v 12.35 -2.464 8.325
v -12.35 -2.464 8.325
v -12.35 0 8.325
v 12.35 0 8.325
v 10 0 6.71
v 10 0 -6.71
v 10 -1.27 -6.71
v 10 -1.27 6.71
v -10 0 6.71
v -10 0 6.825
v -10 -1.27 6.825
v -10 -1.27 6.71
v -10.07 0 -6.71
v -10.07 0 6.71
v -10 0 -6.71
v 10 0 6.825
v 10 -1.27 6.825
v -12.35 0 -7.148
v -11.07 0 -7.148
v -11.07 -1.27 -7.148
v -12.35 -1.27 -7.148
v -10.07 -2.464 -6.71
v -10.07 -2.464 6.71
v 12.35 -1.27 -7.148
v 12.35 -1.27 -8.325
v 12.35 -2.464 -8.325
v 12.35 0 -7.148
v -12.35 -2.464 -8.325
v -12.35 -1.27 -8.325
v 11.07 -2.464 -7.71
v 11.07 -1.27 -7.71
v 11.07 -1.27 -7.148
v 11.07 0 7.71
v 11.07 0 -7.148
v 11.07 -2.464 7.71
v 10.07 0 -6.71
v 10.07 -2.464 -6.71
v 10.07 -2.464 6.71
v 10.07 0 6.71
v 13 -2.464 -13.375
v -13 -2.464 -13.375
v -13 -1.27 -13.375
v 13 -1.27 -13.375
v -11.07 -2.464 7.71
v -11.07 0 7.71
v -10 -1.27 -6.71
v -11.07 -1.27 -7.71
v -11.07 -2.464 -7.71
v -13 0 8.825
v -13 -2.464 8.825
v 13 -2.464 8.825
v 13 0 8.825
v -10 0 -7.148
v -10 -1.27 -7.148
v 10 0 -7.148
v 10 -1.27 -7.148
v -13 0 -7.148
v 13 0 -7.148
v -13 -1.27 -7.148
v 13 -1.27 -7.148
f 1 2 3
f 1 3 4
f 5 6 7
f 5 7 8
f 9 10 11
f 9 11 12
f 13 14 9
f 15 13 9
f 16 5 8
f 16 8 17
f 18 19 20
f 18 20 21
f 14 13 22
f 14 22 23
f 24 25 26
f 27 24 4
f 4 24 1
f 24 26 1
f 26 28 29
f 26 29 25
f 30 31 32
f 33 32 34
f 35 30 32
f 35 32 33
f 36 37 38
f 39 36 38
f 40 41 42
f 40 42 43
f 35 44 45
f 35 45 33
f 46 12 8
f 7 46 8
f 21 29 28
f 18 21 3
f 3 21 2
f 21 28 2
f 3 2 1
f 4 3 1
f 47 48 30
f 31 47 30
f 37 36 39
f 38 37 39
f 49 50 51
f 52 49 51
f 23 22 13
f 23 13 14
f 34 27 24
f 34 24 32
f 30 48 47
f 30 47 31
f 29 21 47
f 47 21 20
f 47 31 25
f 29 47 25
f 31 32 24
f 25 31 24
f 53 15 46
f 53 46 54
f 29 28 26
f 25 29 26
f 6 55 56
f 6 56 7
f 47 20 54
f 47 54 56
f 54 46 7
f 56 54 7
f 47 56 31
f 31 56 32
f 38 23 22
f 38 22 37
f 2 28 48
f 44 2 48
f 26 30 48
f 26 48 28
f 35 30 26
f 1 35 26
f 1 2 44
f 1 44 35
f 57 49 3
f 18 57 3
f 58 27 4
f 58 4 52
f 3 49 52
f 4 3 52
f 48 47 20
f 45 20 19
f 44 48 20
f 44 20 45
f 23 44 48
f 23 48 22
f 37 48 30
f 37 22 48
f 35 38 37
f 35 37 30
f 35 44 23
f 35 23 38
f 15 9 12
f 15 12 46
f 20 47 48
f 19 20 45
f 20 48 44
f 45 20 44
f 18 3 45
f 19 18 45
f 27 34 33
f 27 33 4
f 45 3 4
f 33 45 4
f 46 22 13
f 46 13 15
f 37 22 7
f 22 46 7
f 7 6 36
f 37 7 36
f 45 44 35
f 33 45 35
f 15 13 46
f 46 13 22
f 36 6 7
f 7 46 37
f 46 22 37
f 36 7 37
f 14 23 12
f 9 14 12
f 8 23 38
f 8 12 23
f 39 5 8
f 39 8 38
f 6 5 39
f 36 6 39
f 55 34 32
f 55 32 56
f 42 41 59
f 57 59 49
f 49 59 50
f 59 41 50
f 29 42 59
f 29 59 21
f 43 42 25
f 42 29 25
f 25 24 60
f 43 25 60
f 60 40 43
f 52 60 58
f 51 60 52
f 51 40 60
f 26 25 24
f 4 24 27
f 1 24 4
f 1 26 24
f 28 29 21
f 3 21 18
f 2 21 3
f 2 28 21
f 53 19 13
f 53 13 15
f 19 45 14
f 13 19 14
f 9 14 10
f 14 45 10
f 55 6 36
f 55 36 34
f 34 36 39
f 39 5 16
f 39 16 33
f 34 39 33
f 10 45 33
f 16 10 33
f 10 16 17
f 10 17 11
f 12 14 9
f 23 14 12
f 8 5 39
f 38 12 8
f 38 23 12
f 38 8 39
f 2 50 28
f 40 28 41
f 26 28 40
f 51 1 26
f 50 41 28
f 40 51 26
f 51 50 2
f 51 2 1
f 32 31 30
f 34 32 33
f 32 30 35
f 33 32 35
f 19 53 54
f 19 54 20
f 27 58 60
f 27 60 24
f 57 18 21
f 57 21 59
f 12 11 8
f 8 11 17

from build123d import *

# Parameters (mm, degrees)
F0_W     = 20.14
F0_H     = 13.42
F1_DEPTH = 2.4638
F2_W     = 22.14
F2_H     = 15.42
F2_W_2   = 20.14
F2_H_2   = 13.42
F3_DEPTH = 2.4638
F4_W     = 24.7
F4_H     = 16.65
F4_W_2   = 22.14
F4_H_2   = 15.42
F5_DEPTH = 2.4638
F6_W     = 26
F6_H     = 22.2
F6_W_2   = 24.7
F6_H_2   = 16.65
F7_DEPTH = 2.4638
F9_DEPTH = 1.27


with BuildPart() as f1:
    # F0 (on Front) → F1 (new body)
    with BuildSketch(Plane.XZ):
        Rectangle(F0_W, F0_H)
    extrude(amount=F1_DEPTH)


with BuildPart() as f3:
    # F2 (on face) → F3 (new body)
    with BuildSketch(Plane.XZ.offset(2.4638)):
        Rectangle(F2_W, F2_H)
        Rectangle(F2_W_2, F2_H_2, mode=Mode.SUBTRACT)
    extrude(amount=-F3_DEPTH)


with BuildPart() as f5:
    # F4 (on face) → F5 (new body)
    with BuildSketch(Plane.XZ.offset(2.4638)):
        Rectangle(F4_W, F4_H)
        Rectangle(F4_W_2, F4_H_2, mode=Mode.SUBTRACT)
    extrude(amount=-F5_DEPTH)


with BuildPart() as f7:
    # F6 (on face) → F7 (new body)
    with BuildSketch(Plane.XZ.offset(2.4638)):
        with Locations((0, -2.275)):
            Rectangle(F6_W, F6_H)
        Rectangle(F6_W_2, F6_H_2, mode=Mode.SUBTRACT)
    extrude(amount=-F7_DEPTH)


with BuildPart() as f9_tool:
    # F8 (on Front) → F9 (new body)
    with BuildSketch(Plane.XZ):
        Polygon((10, 6.825), (-10, 6.825), (-10, -7.148381), (-13, -7.148381), (-13, -13.375), (13, -13.375), (13, -7.148381), (10, -7.148381), align=None)
    extrude(amount=F9_DEPTH)


with BuildPart() as f1_1:
    add(f1.part)

    # F9: cut by f9_tool
    add(f9_tool.part, mode=Mode.SUBTRACT)


with BuildPart() as f3_1:
    add(f3.part)

    # F9: cut by f9_tool
    add(f9_tool.part, mode=Mode.SUBTRACT)


with BuildPart() as f5_1:
    add(f5.part)

    # F9: cut by f9_tool
    add(f9_tool.part, mode=Mode.SUBTRACT)


with BuildPart() as f7_1:
    add(f7.part)

    # F9: cut by f9_tool
    add(f9_tool.part, mode=Mode.SUBTRACT)


solid = Compound([f1_1.part, f3_1.part, f5_1.part, f7_1.part])
